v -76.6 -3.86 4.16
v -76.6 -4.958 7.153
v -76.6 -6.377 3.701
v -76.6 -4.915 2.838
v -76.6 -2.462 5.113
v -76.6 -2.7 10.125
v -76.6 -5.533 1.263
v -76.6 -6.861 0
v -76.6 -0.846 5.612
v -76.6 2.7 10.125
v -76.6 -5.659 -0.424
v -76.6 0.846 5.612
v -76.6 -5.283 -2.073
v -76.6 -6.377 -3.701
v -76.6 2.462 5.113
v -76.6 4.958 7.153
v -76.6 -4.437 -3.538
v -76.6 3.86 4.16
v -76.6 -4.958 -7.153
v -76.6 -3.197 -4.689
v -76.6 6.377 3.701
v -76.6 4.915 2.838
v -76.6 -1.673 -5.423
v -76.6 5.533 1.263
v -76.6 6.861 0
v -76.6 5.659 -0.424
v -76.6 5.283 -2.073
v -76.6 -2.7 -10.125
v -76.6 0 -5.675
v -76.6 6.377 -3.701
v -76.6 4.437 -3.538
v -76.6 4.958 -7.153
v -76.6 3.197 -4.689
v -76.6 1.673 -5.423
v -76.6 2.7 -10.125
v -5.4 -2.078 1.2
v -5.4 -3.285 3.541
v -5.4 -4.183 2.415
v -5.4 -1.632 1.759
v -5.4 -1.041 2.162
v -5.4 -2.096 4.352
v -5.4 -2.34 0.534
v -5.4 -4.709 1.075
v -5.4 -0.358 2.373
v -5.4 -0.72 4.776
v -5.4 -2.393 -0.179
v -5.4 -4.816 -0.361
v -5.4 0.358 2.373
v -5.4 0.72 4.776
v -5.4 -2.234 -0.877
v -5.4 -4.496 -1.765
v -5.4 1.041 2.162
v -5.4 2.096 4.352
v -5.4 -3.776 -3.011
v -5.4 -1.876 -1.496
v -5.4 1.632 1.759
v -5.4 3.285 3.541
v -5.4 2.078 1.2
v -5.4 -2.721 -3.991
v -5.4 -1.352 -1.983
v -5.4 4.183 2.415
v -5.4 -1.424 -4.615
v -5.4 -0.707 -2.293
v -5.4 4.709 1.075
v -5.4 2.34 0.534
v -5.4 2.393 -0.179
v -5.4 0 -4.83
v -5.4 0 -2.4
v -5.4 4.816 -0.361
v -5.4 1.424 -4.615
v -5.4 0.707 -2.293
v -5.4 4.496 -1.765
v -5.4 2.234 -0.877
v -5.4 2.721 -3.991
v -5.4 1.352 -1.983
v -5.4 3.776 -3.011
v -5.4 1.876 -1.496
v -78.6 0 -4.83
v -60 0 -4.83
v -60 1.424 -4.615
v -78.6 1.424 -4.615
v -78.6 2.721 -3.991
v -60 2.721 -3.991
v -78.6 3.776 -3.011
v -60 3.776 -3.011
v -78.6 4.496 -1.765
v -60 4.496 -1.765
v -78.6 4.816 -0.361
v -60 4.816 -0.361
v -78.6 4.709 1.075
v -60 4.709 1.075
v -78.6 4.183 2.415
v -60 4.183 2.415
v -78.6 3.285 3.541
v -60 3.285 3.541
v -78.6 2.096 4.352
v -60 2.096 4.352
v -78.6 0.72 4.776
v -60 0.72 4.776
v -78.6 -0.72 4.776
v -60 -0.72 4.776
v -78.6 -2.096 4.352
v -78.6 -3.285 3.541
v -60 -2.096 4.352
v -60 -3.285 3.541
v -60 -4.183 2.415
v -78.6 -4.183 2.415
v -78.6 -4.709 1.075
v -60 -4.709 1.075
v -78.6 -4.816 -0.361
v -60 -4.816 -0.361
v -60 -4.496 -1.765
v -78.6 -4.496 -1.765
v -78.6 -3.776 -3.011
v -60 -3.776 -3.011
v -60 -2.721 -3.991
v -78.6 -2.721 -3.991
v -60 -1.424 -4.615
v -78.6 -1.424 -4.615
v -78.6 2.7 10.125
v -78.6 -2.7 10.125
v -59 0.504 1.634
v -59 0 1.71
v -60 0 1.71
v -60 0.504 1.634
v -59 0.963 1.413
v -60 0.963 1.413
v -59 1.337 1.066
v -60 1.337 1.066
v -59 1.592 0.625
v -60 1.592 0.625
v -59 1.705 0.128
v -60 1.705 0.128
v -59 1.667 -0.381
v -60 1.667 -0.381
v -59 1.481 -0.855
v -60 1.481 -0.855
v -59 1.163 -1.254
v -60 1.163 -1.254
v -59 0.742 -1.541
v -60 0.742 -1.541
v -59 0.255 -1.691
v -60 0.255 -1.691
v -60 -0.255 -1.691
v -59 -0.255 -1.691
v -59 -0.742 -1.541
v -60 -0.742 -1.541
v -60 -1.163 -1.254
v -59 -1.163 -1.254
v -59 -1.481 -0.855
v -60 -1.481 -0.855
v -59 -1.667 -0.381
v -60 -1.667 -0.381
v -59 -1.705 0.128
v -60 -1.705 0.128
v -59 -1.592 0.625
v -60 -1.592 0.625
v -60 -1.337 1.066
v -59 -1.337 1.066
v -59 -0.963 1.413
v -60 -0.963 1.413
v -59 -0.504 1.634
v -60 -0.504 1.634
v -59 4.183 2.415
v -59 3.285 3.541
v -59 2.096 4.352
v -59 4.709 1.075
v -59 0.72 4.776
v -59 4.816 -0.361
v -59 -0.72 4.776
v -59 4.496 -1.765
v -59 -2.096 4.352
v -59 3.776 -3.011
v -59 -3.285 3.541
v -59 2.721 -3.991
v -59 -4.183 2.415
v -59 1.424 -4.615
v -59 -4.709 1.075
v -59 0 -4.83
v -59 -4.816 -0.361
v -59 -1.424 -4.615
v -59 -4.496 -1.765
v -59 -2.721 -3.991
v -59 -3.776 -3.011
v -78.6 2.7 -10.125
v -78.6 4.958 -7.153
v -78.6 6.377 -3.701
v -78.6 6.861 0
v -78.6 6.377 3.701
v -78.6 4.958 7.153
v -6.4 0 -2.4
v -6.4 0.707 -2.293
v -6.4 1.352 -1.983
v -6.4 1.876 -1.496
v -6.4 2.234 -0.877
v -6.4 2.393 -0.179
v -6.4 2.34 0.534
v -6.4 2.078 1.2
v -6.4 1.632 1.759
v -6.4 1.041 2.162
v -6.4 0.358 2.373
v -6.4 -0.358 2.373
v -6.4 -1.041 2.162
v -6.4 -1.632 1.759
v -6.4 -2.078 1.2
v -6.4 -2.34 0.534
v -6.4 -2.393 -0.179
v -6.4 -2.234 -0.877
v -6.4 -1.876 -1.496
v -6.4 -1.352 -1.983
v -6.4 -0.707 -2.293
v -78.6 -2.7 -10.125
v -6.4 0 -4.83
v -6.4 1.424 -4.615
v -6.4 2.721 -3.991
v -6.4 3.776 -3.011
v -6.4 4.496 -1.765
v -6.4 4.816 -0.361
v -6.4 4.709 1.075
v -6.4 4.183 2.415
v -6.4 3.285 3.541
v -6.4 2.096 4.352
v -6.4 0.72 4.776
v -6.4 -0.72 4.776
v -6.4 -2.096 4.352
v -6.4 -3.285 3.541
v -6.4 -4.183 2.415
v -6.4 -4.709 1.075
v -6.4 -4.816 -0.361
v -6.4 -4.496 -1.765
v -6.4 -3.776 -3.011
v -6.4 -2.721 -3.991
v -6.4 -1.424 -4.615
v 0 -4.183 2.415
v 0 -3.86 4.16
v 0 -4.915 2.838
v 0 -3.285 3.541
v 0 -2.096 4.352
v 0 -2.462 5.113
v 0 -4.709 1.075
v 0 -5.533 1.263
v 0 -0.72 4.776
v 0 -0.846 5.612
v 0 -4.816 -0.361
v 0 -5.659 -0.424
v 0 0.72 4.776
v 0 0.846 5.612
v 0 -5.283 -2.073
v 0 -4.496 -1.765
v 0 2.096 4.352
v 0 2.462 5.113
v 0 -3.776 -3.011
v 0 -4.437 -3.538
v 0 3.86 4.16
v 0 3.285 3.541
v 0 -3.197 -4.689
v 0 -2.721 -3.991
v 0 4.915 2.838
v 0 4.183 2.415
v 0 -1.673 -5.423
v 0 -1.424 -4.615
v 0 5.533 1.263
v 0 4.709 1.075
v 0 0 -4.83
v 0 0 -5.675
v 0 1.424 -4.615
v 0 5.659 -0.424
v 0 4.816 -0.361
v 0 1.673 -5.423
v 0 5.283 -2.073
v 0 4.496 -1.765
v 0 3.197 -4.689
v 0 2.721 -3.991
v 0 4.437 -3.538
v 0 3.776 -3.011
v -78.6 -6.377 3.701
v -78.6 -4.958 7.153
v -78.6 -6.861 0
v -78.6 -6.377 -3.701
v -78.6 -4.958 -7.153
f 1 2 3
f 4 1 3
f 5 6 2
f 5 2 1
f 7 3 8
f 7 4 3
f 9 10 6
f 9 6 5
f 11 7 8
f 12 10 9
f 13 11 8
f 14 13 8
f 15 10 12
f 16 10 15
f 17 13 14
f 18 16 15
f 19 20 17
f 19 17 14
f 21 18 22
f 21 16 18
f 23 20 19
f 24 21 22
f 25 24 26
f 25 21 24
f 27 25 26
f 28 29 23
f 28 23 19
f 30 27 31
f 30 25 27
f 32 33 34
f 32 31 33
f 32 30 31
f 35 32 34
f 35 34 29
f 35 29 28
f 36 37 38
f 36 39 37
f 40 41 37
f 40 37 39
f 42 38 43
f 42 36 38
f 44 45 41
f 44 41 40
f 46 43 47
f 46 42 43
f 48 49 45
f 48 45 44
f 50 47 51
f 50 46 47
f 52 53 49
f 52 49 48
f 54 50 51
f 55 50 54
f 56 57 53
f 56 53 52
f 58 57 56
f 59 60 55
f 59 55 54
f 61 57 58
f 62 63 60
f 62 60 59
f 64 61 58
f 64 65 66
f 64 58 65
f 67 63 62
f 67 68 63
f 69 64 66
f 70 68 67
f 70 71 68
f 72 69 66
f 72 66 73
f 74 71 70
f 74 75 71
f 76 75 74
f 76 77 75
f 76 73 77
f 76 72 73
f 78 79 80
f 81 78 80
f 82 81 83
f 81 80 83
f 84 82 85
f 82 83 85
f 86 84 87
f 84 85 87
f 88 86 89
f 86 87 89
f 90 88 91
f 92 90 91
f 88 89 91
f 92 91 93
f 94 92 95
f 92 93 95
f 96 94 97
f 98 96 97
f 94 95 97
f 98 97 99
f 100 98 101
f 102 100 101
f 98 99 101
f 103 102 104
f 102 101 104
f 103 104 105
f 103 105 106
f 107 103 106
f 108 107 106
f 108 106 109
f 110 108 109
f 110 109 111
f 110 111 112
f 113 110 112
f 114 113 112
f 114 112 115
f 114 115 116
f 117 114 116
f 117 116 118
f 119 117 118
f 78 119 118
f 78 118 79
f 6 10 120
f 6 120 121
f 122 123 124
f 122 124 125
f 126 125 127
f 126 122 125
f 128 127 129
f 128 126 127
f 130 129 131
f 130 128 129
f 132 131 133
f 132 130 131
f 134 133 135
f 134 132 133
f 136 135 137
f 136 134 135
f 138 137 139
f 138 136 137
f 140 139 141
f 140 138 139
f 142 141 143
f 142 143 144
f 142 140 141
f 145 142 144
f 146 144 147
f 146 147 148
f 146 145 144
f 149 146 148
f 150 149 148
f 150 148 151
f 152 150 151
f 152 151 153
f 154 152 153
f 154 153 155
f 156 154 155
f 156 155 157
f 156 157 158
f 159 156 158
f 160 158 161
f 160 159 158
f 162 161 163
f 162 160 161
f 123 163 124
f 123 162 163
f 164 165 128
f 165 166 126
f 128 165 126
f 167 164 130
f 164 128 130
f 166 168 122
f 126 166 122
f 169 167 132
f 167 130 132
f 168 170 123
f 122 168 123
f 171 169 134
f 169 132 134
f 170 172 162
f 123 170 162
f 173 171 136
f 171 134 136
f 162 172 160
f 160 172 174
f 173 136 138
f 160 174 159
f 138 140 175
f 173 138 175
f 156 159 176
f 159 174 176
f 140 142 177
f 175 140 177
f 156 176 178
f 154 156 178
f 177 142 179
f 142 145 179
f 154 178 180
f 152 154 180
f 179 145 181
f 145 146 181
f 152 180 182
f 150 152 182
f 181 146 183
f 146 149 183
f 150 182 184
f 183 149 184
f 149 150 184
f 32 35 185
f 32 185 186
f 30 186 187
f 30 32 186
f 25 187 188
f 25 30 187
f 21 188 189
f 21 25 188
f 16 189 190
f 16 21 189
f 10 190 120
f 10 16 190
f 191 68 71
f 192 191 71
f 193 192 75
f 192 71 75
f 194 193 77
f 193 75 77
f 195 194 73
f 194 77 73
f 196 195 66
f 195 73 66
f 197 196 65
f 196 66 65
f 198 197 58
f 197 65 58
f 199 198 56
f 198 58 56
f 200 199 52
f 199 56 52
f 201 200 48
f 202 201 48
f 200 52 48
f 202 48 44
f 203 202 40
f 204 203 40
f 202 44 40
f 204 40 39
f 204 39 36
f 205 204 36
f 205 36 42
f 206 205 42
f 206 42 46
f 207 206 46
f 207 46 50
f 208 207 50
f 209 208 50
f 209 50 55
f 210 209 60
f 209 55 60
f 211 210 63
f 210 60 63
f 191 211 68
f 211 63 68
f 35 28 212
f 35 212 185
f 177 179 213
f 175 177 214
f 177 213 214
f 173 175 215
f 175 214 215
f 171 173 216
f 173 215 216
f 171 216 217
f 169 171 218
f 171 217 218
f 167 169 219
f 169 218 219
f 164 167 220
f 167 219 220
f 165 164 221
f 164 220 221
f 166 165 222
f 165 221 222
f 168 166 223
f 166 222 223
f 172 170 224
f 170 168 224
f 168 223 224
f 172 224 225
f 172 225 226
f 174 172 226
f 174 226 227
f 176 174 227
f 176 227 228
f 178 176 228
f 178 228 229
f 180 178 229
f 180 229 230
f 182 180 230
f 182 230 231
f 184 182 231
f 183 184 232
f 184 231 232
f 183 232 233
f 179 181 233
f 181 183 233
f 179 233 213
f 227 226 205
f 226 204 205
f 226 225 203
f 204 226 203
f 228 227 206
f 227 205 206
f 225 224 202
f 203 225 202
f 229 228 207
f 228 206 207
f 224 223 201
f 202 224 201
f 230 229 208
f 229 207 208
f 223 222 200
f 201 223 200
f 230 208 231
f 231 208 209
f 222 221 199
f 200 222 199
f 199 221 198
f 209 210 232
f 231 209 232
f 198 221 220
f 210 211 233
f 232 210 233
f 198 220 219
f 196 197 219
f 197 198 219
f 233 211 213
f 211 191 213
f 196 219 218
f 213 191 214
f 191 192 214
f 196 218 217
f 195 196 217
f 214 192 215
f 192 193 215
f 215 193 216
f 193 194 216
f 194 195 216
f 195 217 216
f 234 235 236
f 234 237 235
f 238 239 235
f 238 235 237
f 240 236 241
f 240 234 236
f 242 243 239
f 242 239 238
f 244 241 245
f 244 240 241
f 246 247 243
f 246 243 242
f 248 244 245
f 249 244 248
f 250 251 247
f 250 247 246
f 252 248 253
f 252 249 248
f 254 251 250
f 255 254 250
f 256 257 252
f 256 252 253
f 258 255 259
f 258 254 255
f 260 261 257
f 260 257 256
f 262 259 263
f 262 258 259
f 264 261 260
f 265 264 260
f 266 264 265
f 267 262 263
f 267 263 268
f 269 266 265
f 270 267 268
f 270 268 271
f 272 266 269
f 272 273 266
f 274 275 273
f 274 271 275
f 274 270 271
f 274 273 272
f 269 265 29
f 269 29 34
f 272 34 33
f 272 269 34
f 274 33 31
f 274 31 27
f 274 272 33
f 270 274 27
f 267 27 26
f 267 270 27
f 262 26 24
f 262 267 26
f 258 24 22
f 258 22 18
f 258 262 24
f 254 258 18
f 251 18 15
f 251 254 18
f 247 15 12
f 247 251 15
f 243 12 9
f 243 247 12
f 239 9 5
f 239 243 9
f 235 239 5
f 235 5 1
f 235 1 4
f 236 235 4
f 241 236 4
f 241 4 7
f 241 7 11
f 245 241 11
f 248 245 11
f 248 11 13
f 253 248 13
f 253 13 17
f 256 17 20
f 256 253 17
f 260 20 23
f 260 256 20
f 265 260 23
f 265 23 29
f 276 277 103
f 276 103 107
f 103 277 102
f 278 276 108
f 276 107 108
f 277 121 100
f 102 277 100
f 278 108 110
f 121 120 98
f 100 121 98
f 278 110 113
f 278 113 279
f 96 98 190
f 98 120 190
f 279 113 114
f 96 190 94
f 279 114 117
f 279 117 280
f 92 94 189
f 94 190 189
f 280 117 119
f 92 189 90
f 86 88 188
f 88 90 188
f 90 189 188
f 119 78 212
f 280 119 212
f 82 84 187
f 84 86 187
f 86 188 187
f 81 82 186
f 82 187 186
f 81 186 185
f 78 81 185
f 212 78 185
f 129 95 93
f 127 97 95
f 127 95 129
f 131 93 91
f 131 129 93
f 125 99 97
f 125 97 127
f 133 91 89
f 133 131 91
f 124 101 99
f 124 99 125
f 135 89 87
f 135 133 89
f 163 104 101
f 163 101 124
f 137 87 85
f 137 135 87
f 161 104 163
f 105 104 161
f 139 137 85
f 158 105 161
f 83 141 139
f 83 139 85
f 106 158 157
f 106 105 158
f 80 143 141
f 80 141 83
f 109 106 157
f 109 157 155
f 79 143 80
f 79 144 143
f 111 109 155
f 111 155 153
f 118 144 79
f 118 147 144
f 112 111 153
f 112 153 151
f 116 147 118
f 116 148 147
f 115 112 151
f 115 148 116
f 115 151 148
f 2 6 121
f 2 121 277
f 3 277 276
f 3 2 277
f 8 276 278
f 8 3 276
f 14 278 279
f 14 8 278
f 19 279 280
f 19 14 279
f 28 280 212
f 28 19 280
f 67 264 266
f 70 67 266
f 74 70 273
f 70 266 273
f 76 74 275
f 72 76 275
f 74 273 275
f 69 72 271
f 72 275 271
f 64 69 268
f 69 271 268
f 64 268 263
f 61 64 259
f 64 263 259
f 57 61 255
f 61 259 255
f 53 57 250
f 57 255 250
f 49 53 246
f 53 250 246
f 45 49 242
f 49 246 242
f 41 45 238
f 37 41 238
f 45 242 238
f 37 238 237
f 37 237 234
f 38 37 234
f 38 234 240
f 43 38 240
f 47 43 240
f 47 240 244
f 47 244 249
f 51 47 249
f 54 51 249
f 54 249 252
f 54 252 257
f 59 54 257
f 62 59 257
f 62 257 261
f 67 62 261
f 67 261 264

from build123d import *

# Parameters (mm, degrees)
SKETCH1_R           = 5.675
BOSS_EXTRUDE1_DEPTH = 76.6
BOSS_EXTRUDE2_DEPTH = 2
SKETCH3_R           = 4.83
CUT_EXTRUDE1_DEPTH  = 80.545861523
BOSS_EXTRUDE3_START = -1
SKETCH4_R           = 4.83
SKETCH4_R_2         = 1.71
BOSS_EXTRUDE3_DEPTH = 1
SKETCH5_R           = 4.83
SKETCH5_R_2         = 2.4
BOSS_EXTRUDE4_DEPTH = 1


with BuildPart() as part:
    # Sketch1 → Boss-Extrude1 (new body)
    with BuildSketch(Plane(origin=(0, 0, 0), x_dir=(0, 0, -1), z_dir=(1, 0, 0))):
        Circle(SKETCH1_R)
    extrude(amount=-BOSS_EXTRUDE1_DEPTH)

    # Sketch2 → Boss-Extrude2 (add)
    with BuildSketch(Plane.ZY.offset(76.6)):
        with BuildLine():
            Line((-10.125, -2.7), (-10.125, 2.7))
            ThreePointArc((-10.125, 2.7), (0, 6.860645772), (10.125, 2.7))
            Line((10.125, 2.7), (10.125, -2.7))
            ThreePointArc((10.125, -2.7), (0, -6.860645772), (-10.125, -2.7))
        make_face()
    extrude(amount=BOSS_EXTRUDE2_DEPTH)

    # Sketch3 → Cut-Extrude1 (cut, through all)
    with BuildSketch(Plane(origin=(0, 0, 0), x_dir=(0, 0, -1), z_dir=(1, 0, 0))):
        Circle(SKETCH3_R)
    extrude(amount=-CUT_EXTRUDE1_DEPTH, mode=Mode.SUBTRACT)

    # Sketch4 → Boss-Extrude3 (add)
    with BuildSketch(Plane.ZY.offset(60).offset(BOSS_EXTRUDE3_START)):
        with Locations(Location((0, 0, 0), (0, 0, 180))):
            Circle(SKETCH4_R)
        Circle(SKETCH4_R_2, mode=Mode.SUBTRACT)
    extrude(amount=BOSS_EXTRUDE3_DEPTH)

    # Sketch5 → Boss-Extrude4 (add)
    with BuildSketch(Plane(origin=(-5.4, 0, 0), x_dir=(0, 0, -1), z_dir=(1, 0, 0))):
        Circle(SKETCH5_R)
        Circle(SKETCH5_R_2, mode=Mode.SUBTRACT)
    extrude(amount=-BOSS_EXTRUDE4_DEPTH)


solid = part.part
